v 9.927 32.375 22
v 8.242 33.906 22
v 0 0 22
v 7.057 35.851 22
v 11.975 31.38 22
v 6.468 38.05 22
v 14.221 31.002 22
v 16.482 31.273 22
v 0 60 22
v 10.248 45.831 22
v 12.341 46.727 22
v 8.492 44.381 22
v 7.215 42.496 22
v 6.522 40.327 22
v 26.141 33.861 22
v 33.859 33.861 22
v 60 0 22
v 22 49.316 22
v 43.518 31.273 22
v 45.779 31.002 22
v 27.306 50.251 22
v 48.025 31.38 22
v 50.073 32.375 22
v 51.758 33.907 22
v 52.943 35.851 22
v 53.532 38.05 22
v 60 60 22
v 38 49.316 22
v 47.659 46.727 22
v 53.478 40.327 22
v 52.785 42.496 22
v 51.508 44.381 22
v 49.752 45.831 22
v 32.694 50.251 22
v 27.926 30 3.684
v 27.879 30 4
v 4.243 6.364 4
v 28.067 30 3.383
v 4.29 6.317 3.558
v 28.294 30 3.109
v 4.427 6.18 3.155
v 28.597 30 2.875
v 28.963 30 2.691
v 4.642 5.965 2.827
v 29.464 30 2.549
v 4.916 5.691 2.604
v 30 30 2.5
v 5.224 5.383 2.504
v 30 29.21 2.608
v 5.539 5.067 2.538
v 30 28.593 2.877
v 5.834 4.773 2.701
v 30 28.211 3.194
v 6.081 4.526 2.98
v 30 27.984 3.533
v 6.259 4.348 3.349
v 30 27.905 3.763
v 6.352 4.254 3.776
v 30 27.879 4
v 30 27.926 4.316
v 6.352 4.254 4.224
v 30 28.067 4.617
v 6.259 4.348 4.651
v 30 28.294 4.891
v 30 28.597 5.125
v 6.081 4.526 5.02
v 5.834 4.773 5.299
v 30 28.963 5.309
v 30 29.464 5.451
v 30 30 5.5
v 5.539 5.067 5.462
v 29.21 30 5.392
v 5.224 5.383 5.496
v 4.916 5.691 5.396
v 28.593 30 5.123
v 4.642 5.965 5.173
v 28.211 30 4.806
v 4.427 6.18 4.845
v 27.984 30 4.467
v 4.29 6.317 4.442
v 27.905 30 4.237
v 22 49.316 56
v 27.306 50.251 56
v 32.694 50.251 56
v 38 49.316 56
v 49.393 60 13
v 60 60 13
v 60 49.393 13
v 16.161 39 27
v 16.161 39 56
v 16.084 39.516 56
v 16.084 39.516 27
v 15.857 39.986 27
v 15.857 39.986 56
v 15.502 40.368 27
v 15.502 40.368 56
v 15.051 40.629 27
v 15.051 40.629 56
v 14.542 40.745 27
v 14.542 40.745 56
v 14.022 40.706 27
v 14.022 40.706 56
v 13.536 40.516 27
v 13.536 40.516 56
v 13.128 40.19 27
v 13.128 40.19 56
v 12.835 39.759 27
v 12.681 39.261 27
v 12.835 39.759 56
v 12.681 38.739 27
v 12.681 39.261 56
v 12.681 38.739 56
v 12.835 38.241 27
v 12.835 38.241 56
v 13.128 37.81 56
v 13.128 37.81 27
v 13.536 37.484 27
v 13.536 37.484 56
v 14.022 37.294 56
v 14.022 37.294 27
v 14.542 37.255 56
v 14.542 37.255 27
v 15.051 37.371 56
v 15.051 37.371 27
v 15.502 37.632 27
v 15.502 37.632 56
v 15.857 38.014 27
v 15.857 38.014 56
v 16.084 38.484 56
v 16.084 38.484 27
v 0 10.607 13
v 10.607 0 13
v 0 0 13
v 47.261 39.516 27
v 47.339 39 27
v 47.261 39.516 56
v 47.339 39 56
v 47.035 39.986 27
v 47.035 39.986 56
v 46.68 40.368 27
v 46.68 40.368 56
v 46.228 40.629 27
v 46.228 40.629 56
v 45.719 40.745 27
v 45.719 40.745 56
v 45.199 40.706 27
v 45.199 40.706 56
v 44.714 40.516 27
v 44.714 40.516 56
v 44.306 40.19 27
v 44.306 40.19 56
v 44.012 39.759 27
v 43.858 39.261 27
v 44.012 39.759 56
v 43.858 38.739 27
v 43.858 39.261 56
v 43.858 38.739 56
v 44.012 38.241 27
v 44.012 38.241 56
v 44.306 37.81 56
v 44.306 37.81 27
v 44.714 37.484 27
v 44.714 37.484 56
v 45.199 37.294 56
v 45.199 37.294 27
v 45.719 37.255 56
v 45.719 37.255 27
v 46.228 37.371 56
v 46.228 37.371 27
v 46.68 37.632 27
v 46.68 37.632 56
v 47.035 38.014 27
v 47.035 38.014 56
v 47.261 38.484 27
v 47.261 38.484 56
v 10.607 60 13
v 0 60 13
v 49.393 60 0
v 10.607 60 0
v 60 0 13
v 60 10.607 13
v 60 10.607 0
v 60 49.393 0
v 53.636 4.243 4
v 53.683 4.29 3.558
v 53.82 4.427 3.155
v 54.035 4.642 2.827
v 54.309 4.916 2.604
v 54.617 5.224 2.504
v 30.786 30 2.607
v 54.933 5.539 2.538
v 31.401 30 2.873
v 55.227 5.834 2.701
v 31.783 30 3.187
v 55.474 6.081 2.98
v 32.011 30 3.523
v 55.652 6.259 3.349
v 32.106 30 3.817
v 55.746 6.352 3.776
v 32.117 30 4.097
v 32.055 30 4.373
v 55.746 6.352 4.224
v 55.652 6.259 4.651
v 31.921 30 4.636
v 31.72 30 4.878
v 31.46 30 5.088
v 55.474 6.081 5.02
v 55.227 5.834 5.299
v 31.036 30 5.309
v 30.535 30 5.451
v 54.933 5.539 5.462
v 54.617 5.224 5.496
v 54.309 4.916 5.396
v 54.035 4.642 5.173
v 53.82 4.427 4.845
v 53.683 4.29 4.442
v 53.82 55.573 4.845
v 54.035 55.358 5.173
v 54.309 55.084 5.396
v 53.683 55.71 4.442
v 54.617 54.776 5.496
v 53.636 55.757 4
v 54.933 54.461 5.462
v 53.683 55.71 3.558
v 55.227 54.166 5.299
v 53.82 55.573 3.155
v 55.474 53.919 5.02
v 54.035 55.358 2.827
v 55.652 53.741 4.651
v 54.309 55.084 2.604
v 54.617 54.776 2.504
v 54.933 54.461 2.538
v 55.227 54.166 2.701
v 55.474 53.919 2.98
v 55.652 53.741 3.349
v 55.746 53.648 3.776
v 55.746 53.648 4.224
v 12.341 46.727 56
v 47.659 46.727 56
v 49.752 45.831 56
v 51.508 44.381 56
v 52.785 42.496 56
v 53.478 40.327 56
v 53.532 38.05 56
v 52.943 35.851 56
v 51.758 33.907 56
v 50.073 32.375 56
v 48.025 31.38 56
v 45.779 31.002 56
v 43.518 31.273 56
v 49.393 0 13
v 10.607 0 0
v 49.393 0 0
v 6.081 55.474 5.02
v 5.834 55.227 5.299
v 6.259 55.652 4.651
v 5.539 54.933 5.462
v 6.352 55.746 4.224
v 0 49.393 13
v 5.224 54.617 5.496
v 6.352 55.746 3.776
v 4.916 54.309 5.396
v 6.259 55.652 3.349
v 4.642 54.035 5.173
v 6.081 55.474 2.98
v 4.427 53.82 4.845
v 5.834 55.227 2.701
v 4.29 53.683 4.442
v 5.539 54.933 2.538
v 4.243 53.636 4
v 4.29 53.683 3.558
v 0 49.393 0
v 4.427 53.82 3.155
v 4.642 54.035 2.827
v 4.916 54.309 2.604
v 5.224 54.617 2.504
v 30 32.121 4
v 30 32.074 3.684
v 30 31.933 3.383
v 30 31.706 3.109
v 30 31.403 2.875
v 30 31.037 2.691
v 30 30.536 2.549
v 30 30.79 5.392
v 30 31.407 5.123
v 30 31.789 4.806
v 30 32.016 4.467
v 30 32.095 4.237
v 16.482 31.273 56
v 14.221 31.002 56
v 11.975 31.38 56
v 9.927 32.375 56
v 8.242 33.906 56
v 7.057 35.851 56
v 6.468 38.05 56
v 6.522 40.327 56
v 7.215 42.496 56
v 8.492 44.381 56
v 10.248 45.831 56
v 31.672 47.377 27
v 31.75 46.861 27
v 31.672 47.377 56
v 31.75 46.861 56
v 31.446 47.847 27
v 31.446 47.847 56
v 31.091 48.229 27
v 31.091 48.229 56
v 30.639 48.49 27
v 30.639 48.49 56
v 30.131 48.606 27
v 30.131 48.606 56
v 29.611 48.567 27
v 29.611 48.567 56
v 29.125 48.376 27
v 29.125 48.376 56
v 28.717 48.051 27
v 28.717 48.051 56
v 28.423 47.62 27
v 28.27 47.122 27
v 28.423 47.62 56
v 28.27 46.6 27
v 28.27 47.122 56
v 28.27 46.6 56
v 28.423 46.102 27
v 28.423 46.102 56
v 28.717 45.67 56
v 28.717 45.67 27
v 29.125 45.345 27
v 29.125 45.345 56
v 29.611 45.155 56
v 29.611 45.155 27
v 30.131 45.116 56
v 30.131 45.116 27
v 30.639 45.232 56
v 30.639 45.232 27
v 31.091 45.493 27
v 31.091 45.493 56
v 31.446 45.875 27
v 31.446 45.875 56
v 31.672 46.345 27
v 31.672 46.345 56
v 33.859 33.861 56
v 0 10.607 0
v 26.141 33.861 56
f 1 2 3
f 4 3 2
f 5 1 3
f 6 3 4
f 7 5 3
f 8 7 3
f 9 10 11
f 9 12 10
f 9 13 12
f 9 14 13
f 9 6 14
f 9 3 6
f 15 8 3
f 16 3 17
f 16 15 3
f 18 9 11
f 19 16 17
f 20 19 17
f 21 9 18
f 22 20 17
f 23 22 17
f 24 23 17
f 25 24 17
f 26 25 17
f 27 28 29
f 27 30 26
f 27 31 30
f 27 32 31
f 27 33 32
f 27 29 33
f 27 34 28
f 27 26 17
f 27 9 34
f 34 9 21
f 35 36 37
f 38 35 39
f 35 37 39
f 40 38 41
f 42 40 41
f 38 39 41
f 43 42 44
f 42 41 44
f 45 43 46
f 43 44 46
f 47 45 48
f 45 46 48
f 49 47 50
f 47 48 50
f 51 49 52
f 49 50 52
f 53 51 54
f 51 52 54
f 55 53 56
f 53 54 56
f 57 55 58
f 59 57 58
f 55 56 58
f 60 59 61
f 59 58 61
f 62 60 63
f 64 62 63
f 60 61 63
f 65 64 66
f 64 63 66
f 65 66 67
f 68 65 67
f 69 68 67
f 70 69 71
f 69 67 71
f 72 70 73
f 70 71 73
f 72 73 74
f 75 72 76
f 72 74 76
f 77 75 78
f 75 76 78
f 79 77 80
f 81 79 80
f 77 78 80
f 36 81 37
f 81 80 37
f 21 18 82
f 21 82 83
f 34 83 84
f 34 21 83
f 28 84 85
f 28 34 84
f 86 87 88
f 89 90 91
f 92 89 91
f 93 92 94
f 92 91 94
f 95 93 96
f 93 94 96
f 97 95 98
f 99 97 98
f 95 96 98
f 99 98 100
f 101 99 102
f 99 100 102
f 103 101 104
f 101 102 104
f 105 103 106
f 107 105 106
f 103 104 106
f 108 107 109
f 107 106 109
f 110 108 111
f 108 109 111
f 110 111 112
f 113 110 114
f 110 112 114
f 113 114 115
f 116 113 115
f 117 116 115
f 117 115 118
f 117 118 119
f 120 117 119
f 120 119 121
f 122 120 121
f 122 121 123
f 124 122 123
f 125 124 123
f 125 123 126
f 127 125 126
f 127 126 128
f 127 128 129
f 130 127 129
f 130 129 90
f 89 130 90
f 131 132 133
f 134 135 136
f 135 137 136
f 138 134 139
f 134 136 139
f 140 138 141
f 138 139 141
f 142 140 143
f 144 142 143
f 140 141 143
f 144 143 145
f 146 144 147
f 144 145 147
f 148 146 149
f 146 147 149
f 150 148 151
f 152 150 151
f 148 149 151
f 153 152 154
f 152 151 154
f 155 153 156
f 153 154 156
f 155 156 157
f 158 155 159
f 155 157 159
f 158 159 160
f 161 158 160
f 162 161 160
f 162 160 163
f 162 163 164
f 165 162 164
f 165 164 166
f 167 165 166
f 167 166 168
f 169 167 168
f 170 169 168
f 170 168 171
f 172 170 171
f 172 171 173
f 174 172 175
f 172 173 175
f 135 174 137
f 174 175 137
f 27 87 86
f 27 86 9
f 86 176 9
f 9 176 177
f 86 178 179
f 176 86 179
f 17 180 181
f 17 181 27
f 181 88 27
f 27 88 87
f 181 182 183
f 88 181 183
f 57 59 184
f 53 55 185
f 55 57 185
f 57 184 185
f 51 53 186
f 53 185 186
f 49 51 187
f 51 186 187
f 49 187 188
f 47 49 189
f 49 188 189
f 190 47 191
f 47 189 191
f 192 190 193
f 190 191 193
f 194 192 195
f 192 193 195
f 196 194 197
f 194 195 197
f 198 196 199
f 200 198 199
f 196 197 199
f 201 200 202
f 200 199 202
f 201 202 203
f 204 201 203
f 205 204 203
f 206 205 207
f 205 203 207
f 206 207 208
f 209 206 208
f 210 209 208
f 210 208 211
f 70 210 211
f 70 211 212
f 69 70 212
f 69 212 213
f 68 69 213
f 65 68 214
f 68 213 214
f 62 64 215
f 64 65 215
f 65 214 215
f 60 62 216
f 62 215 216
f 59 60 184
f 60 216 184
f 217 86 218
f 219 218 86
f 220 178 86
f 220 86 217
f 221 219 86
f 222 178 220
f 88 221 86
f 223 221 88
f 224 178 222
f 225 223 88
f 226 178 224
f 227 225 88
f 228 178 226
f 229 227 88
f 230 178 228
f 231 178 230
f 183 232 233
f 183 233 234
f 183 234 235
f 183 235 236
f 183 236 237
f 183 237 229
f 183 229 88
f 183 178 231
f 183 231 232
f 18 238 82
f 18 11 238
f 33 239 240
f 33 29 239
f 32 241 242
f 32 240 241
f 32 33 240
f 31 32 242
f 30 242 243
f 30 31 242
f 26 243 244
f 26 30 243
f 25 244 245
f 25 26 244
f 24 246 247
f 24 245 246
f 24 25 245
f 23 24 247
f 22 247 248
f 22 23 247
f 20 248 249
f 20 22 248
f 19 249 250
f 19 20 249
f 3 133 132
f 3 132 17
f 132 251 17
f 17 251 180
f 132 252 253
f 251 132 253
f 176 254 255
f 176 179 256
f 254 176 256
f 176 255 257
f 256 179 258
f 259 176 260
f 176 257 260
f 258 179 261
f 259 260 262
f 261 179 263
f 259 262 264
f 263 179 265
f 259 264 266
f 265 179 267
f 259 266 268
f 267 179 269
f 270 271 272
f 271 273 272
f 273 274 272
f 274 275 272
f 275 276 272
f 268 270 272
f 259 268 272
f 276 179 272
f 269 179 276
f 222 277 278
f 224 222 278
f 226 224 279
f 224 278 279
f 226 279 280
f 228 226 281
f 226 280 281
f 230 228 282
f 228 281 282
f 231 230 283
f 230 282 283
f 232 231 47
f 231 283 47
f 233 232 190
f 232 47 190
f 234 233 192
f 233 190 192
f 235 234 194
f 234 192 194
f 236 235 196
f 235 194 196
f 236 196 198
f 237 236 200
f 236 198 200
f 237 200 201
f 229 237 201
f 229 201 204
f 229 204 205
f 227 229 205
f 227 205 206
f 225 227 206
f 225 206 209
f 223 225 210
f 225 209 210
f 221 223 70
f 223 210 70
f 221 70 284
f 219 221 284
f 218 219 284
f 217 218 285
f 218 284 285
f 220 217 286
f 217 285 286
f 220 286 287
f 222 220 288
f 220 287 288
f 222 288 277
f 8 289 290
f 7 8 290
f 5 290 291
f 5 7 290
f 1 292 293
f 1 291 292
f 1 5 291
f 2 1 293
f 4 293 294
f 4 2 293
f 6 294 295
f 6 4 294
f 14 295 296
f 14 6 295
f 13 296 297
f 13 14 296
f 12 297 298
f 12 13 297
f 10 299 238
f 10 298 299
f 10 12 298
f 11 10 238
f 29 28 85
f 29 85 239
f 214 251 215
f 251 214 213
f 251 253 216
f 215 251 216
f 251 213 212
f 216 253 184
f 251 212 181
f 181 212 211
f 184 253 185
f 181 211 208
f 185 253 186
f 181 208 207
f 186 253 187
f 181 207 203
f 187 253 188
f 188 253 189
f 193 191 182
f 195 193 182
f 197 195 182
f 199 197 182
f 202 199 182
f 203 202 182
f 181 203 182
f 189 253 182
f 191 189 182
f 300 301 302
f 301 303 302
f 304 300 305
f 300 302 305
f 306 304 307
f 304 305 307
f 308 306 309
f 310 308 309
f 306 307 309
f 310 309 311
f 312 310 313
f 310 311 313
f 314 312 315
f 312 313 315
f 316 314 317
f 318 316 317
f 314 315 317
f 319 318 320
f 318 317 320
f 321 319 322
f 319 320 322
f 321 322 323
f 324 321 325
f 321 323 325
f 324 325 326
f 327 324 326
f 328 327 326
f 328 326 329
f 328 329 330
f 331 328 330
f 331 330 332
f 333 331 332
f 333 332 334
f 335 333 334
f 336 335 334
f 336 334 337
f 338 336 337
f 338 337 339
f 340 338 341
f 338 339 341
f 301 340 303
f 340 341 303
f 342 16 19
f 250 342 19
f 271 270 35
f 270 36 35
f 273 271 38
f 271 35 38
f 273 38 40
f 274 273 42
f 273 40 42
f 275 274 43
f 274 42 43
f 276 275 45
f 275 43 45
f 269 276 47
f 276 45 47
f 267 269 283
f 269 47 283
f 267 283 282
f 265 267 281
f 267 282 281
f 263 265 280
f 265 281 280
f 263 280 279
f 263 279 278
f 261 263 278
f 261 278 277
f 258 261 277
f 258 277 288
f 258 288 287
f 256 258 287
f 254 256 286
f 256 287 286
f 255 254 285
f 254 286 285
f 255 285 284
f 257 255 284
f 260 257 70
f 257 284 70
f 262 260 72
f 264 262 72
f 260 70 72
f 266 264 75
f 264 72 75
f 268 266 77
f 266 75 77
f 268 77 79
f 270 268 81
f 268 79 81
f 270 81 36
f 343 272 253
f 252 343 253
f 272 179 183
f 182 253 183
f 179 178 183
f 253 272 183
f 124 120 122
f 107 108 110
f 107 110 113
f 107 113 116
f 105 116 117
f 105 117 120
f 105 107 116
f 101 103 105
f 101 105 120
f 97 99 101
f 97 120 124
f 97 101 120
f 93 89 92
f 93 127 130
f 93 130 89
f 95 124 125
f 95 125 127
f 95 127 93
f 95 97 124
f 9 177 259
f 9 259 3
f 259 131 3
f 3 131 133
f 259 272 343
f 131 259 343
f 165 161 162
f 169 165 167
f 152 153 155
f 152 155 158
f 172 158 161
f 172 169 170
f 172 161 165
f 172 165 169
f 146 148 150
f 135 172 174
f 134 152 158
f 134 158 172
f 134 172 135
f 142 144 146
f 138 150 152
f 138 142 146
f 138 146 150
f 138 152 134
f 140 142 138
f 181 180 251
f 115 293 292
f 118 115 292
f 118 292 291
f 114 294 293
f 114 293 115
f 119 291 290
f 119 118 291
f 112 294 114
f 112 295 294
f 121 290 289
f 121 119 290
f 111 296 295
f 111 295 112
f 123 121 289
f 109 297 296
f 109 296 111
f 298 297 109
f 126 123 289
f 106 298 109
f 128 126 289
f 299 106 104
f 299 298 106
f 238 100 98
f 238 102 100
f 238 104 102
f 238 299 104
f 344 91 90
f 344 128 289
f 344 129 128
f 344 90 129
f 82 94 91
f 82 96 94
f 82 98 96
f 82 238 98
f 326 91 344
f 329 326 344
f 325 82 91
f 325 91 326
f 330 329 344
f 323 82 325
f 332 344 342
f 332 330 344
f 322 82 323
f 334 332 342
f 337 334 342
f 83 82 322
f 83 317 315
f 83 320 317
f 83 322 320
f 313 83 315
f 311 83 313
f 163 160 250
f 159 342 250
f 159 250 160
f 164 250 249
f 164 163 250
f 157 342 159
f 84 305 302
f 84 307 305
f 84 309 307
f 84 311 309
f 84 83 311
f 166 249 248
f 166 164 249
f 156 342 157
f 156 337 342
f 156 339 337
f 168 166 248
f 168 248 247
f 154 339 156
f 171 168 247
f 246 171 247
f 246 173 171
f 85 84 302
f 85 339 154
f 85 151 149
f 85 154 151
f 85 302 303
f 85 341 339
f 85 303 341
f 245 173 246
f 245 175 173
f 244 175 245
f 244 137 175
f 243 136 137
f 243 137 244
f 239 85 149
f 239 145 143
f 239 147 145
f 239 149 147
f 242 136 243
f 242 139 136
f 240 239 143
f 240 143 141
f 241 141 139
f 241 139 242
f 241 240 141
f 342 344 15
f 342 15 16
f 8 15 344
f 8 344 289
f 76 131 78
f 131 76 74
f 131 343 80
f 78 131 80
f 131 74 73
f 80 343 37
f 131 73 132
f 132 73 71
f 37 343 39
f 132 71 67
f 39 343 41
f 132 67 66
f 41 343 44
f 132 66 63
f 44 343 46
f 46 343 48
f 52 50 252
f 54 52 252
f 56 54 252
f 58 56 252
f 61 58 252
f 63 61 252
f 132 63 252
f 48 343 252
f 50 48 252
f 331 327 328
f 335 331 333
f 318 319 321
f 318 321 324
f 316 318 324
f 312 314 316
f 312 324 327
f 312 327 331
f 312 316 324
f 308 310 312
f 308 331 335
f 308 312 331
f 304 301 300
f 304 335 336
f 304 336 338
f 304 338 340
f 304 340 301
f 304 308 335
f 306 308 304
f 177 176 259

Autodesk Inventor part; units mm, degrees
ref_plane "YZ Plane" through (0, 0, 0) normal (1, 0, 0) x (0, 1, 0)
ref_plane "XZ Plane" through (0, 0, 0) normal (0, 1, 0) x (-1, 0, 0)
ref_plane "XY Plane" through (0, 0, 0) normal (0, 0, 1) x (1, 0, 0)
sketch "Sketch1" plane through (0, 0, 0) normal (0, 0, 1) x (1, 0, 0)
  line L0 (0, 0) -> (60, 0)
  line L1 (60, 0) -> (60, 60)
  line L2 (60, 60) -> (0, 60)
  line L3 (0, 60) -> (0, 0)
  dimension "d0" = 60
  dimension "d1" = 60
extrude "Extrusion1" add sketch "Sketch1" along normal blind 22
sketch "Sketch2" plane through (0, 0, 0) normal (0, 0, -1) x (-1, 0, 0)
  line L0 (0, 10.6066) -> (-10.6066, 0)
  line L1 (0, 10.6066) -> (0, 0)
  line L2 (0, 0) -> (-10.6066, 0)
  line L3 (0, 60) -> (-10.6066, 60)
  line L4 (-10.6066, 60) -> (0, 49.3934)
  line L5 (0, 49.3934) -> (0, 60)
  line L6 (-49.3934, 60) -> (-60, 60)
  line L7 (-60, 60) -> (-60, 49.3934)
  line L8 (-49.3934, 60) -> (-60, 49.3934)
  line L9 (-49.3934, 0) -> (-60, 0)
  line L10 (-60, 0) -> (-60, 10.6066)
  line L11 (-49.3934, 0) -> (-60, 10.6066)
  dimension "d4" = 15
  dimension "d7" = 15
  dimension "d8" = 15
  dimension "d9" = 15
extrude "Extrusion2" cut sketch "Sketch2" against normal blind 13
sketch "Sketch7" plane through (0, 0, 22) normal (0, 0, 1) x (1, 0, 0)
  circle A0 centre (45.5887, 39) radius 8 construction
  circle A1 centre (14.4113, 39) radius 8 construction
  line L0 (22, 49.3156) -> (26.1411, 33.8608) construction
  line L1 (26.1411, 33.8608) -> (16.4818, 31.2726)
  line L2 (12.3407, 46.7274) -> (22, 49.3156)
  line L3 (33.8589, 33.8608) -> (38, 49.3156) construction
  line L4 (38, 49.3156) -> (47.6593, 46.7274)
  line L5 (33.8589, 33.8608) -> (43.5182, 31.2726)
  line L6 (22, 49.3156) -> (38, 49.3156) construction
  line L7 (26.1411, 33.8608) -> (33.8589, 33.8608)
  arc A2 (12.3407, 46.7274) -> (16.4818, 31.2726) centre (14.4113, 39) ccw
  arc A3 (43.5182, 31.2726) -> (47.6593, 46.7274) centre (45.5887, 39) ccw
  line L8 (60, 60) -> (0, 60) projected
  arc A4 (38, 49.3156) -> (22, 49.3156) centre (30, 19.4592) ccw
  point P0 (0, 0)
  point P1 (30, 49.3156)
  point P2 (30, 60)
  dimension "d28" = 16
  dimension "d29" = 16
  dimension "d30" = 16
  dimension "d31" = 10
  dimension "d32" = 10
  dimension "d33" = 16
  dimension "d34" = 16
  dimension "d36" = 75
  dimension "d37" = 21
extrude "Extrusion7" add sketch "Sketch7" along normal blind 34
sketch "Sketch8" plane through (10.6066, 0, 13) normal (-0.7071, -0.7071, 0) x (-0.7071, 0.7071, 0)
  circle A0 centre (7.5, 9) radius 1.5
  line L0 (0, 13) -> (15, 13) projected
  point P0 (7.5, 13)
  point P1 (7.5, 13)
  dimension "d40" = 3
  dimension "d41" = 4
extrude "Extrusion8" cut sketch "Sketch8" against normal through all
sketch "Sketch9" plane through (60, 10.6066, 13) normal (0.7071, -0.7071, 0) x (-0.7071, -0.7071, 0)
  circle A0 centre (7.5, 9) radius 1.5
  line L0 (0, 13) -> (15, 13) projected
  point P0 (49.9264, 13)
  point P1 (7.5, 13)
  dimension "d44" = 3
  dimension "d45" = 4
extrude "Extrusion9" cut sketch "Sketch9" against normal through all
sketch "Sketch10" plane through (0, 0, 56) normal (0, 0, 1) x (1, 0, 0)
  line L0 (22, 49.3156) -> (12.3407, 46.7274) construction
  arc A0 (12.3407, 46.7274) -> (16.4818, 31.2726) centre (14.4113, 39) ccw construction
  line L1 (16.4818, 31.2726) -> (26.1411, 33.8608) construction
  line L2 (26.1411, 33.8608) -> (33.8589, 33.8608) construction
  line L3 (33.8589, 33.8608) -> (43.5182, 31.2726) construction
  arc A1 (43.5182, 31.2726) -> (47.6593, 46.7274) centre (45.5887, 39) ccw construction
  line L4 (47.6593, 46.7274) -> (38, 49.3156) construction
  arc A2 (38, 49.3156) -> (22, 49.3156) centre (30, 19.4592) ccw construction
  circle A3 centre (14.4113, 39) radius 1.75
  circle A4 centre (45.5887, 39) radius 1.75
  circle A5 centre (30, 46.8608) radius 1.75
  point P0 (0, 0)
  point P1 (30, 33.8608)
  dimension "d48" = 3.5
  dimension "d49" = 3.5
  dimension "d50" = 3.5
  dimension "d51" = 13
extrude "Extrusion10" cut sketch "Sketch10" against normal blind 29
properties part number "Base" material "ABS Plastic"
